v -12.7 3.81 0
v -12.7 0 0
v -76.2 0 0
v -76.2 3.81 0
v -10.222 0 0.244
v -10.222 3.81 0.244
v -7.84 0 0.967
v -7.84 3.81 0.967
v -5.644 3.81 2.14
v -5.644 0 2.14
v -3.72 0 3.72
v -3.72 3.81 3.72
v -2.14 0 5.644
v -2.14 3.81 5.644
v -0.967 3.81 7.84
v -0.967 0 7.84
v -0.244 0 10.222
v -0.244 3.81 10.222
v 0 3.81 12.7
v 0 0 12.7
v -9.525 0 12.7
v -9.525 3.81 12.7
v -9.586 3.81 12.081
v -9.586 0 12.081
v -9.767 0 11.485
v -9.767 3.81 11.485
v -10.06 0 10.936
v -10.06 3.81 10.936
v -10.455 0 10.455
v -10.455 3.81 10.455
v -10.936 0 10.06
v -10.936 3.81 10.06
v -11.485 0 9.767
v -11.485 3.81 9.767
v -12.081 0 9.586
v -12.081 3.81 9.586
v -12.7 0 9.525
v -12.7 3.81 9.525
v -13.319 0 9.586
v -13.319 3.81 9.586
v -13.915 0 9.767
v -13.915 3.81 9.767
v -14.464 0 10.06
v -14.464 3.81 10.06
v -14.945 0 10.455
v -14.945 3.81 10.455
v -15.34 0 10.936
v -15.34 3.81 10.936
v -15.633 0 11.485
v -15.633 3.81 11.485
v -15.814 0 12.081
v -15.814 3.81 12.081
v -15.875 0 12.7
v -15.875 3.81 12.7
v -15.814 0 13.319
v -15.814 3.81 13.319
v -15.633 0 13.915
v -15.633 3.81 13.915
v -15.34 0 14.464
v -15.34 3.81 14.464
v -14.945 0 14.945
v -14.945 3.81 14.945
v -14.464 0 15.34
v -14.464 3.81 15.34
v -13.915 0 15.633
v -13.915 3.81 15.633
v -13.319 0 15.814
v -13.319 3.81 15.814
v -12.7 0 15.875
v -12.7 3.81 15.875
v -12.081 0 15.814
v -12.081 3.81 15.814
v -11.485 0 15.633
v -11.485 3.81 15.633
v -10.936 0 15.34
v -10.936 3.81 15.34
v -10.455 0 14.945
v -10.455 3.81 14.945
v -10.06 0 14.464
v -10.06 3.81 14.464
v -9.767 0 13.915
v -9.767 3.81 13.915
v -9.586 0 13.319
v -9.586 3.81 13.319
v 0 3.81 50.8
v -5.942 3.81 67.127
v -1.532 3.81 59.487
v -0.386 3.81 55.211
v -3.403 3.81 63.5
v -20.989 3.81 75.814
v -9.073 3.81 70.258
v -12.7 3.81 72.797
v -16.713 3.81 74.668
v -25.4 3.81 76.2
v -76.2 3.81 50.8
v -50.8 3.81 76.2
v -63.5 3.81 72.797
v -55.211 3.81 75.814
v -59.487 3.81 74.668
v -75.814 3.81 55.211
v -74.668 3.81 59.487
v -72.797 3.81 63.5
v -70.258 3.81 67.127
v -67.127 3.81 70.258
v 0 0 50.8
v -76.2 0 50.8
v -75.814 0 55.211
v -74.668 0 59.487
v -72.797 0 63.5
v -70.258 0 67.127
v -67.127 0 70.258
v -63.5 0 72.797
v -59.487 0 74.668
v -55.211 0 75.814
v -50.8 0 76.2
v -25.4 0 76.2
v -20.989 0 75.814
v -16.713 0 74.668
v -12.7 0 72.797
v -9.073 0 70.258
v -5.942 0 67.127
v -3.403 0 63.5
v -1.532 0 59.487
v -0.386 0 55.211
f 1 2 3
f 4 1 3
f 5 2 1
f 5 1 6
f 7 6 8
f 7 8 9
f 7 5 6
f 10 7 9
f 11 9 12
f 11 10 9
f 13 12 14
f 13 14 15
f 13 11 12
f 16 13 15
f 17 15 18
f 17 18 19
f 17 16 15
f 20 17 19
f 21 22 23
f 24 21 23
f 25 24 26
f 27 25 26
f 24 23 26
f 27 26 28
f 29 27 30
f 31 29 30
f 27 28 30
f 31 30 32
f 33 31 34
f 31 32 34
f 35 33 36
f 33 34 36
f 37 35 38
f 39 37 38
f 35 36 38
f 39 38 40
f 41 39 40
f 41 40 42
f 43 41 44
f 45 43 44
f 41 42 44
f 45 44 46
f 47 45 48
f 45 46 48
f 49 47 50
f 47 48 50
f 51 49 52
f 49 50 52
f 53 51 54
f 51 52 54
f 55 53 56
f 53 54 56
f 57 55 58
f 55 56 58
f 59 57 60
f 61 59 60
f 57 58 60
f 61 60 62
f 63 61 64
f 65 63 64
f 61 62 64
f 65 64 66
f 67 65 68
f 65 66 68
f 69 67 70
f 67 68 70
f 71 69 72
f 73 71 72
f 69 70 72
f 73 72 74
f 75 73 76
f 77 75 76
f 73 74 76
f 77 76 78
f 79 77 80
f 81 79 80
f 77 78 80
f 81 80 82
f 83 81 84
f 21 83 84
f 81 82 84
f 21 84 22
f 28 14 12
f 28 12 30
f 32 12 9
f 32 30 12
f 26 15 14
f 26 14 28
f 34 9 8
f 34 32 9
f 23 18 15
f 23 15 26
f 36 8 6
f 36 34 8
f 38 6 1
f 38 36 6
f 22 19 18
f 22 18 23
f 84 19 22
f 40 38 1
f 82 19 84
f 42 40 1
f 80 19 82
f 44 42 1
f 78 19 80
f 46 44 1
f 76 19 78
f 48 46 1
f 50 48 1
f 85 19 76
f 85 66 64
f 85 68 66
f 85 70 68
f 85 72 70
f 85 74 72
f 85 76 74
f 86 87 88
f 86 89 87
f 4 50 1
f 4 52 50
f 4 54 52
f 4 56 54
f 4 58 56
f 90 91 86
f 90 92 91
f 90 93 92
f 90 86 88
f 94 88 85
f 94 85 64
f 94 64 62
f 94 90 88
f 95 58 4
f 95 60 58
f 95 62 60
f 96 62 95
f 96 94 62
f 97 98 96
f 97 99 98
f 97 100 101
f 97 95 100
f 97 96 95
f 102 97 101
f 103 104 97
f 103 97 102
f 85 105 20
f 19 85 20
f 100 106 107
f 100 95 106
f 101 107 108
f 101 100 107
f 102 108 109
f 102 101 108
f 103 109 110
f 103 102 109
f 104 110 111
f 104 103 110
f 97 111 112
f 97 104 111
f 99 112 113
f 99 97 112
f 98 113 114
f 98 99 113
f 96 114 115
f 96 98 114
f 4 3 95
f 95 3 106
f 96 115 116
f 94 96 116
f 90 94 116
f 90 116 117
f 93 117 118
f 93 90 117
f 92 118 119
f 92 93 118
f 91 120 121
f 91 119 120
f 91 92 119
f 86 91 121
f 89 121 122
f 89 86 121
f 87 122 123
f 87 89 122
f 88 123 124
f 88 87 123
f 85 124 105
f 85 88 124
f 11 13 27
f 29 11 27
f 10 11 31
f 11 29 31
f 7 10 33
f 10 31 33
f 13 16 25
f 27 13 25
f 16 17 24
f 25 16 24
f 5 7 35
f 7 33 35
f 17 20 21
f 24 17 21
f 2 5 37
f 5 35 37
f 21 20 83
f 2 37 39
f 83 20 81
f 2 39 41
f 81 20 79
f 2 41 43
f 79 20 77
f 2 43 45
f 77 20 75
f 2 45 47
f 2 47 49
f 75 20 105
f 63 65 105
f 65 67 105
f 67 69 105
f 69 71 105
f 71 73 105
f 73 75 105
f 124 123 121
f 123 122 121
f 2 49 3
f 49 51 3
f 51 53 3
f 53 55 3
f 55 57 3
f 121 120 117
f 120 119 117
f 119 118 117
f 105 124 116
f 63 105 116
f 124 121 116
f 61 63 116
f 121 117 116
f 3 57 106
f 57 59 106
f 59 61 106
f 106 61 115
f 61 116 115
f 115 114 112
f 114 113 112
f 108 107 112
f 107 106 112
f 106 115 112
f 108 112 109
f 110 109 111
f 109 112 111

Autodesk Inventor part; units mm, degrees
ref_plane "YZ Plane" through (0, 0, 0) normal (1, 0, 0) x (0, 1, 0)
ref_plane "XZ Plane" through (0, 0, 0) normal (0, 1, 0) x (-1, 0, 0)
ref_plane "XY Plane" through (0, 0, 0) normal (0, 0, 1) x (1, 0, 0)
sketch "Sketch1" plane through (0, 0, 0) normal (0, 1, 0) x (-1, 0, 0)
  line L0 (0, 0) -> (76.2, 0)
  line L1 (76.2, 0) -> (76.2, 76.2)
  line L2 (76.2, 76.2) -> (0, 76.2)
  line L3 (0, 76.2) -> (0, 0)
  dimension "d0" = 76.2
  dimension "d1" = 76.2
extrude "Extrusion1" add sketch "Sketch1" along normal blind 3.81
sketch "Sketch2" plane through (0, 3.81, 0) normal (0, 1, 0) x (1, 0, 0)
  circle A0 centre (-12.7, -12.7) radius 12.7
  circle A1 centre (-12.7, -12.7) radius 3.175
  line L0 (0, 0) -> (-76.2, 0) projected
  line L1 (0, -76.2) -> (0, 0) projected
  dimension "d4" = 25.4
extrude "Extrusion2" cut sketch "Sketch2" against normal blind 3.81 contours A1
sketch "Sketch3" plane through (0, 0, 0) normal (0, -1, 0) x (1, 0, 0)
  circle A0 centre (-12.7, 12.7) radius 3.175 projected
  circle A1 centre (-12.7, 12.7) radius 12.7
  line L0 (0, 76.2) -> (0, 0) projected
  line L1 (0, 0) -> (-76.2, 0) projected
  line L2 (-12.7, 0) -> (0, 0)
  line L3 (0, 0) -> (0, 12.7)
extrude "Extrusion3" cut sketch "Sketch3" against normal blind 3.81 contours L0 L1 A1
fillet "Fillet1" radius 25.4 2 edges at (-76.2, 1.905, 76.2) (0, 1.905, 76.2)
properties part number "moving plate"
